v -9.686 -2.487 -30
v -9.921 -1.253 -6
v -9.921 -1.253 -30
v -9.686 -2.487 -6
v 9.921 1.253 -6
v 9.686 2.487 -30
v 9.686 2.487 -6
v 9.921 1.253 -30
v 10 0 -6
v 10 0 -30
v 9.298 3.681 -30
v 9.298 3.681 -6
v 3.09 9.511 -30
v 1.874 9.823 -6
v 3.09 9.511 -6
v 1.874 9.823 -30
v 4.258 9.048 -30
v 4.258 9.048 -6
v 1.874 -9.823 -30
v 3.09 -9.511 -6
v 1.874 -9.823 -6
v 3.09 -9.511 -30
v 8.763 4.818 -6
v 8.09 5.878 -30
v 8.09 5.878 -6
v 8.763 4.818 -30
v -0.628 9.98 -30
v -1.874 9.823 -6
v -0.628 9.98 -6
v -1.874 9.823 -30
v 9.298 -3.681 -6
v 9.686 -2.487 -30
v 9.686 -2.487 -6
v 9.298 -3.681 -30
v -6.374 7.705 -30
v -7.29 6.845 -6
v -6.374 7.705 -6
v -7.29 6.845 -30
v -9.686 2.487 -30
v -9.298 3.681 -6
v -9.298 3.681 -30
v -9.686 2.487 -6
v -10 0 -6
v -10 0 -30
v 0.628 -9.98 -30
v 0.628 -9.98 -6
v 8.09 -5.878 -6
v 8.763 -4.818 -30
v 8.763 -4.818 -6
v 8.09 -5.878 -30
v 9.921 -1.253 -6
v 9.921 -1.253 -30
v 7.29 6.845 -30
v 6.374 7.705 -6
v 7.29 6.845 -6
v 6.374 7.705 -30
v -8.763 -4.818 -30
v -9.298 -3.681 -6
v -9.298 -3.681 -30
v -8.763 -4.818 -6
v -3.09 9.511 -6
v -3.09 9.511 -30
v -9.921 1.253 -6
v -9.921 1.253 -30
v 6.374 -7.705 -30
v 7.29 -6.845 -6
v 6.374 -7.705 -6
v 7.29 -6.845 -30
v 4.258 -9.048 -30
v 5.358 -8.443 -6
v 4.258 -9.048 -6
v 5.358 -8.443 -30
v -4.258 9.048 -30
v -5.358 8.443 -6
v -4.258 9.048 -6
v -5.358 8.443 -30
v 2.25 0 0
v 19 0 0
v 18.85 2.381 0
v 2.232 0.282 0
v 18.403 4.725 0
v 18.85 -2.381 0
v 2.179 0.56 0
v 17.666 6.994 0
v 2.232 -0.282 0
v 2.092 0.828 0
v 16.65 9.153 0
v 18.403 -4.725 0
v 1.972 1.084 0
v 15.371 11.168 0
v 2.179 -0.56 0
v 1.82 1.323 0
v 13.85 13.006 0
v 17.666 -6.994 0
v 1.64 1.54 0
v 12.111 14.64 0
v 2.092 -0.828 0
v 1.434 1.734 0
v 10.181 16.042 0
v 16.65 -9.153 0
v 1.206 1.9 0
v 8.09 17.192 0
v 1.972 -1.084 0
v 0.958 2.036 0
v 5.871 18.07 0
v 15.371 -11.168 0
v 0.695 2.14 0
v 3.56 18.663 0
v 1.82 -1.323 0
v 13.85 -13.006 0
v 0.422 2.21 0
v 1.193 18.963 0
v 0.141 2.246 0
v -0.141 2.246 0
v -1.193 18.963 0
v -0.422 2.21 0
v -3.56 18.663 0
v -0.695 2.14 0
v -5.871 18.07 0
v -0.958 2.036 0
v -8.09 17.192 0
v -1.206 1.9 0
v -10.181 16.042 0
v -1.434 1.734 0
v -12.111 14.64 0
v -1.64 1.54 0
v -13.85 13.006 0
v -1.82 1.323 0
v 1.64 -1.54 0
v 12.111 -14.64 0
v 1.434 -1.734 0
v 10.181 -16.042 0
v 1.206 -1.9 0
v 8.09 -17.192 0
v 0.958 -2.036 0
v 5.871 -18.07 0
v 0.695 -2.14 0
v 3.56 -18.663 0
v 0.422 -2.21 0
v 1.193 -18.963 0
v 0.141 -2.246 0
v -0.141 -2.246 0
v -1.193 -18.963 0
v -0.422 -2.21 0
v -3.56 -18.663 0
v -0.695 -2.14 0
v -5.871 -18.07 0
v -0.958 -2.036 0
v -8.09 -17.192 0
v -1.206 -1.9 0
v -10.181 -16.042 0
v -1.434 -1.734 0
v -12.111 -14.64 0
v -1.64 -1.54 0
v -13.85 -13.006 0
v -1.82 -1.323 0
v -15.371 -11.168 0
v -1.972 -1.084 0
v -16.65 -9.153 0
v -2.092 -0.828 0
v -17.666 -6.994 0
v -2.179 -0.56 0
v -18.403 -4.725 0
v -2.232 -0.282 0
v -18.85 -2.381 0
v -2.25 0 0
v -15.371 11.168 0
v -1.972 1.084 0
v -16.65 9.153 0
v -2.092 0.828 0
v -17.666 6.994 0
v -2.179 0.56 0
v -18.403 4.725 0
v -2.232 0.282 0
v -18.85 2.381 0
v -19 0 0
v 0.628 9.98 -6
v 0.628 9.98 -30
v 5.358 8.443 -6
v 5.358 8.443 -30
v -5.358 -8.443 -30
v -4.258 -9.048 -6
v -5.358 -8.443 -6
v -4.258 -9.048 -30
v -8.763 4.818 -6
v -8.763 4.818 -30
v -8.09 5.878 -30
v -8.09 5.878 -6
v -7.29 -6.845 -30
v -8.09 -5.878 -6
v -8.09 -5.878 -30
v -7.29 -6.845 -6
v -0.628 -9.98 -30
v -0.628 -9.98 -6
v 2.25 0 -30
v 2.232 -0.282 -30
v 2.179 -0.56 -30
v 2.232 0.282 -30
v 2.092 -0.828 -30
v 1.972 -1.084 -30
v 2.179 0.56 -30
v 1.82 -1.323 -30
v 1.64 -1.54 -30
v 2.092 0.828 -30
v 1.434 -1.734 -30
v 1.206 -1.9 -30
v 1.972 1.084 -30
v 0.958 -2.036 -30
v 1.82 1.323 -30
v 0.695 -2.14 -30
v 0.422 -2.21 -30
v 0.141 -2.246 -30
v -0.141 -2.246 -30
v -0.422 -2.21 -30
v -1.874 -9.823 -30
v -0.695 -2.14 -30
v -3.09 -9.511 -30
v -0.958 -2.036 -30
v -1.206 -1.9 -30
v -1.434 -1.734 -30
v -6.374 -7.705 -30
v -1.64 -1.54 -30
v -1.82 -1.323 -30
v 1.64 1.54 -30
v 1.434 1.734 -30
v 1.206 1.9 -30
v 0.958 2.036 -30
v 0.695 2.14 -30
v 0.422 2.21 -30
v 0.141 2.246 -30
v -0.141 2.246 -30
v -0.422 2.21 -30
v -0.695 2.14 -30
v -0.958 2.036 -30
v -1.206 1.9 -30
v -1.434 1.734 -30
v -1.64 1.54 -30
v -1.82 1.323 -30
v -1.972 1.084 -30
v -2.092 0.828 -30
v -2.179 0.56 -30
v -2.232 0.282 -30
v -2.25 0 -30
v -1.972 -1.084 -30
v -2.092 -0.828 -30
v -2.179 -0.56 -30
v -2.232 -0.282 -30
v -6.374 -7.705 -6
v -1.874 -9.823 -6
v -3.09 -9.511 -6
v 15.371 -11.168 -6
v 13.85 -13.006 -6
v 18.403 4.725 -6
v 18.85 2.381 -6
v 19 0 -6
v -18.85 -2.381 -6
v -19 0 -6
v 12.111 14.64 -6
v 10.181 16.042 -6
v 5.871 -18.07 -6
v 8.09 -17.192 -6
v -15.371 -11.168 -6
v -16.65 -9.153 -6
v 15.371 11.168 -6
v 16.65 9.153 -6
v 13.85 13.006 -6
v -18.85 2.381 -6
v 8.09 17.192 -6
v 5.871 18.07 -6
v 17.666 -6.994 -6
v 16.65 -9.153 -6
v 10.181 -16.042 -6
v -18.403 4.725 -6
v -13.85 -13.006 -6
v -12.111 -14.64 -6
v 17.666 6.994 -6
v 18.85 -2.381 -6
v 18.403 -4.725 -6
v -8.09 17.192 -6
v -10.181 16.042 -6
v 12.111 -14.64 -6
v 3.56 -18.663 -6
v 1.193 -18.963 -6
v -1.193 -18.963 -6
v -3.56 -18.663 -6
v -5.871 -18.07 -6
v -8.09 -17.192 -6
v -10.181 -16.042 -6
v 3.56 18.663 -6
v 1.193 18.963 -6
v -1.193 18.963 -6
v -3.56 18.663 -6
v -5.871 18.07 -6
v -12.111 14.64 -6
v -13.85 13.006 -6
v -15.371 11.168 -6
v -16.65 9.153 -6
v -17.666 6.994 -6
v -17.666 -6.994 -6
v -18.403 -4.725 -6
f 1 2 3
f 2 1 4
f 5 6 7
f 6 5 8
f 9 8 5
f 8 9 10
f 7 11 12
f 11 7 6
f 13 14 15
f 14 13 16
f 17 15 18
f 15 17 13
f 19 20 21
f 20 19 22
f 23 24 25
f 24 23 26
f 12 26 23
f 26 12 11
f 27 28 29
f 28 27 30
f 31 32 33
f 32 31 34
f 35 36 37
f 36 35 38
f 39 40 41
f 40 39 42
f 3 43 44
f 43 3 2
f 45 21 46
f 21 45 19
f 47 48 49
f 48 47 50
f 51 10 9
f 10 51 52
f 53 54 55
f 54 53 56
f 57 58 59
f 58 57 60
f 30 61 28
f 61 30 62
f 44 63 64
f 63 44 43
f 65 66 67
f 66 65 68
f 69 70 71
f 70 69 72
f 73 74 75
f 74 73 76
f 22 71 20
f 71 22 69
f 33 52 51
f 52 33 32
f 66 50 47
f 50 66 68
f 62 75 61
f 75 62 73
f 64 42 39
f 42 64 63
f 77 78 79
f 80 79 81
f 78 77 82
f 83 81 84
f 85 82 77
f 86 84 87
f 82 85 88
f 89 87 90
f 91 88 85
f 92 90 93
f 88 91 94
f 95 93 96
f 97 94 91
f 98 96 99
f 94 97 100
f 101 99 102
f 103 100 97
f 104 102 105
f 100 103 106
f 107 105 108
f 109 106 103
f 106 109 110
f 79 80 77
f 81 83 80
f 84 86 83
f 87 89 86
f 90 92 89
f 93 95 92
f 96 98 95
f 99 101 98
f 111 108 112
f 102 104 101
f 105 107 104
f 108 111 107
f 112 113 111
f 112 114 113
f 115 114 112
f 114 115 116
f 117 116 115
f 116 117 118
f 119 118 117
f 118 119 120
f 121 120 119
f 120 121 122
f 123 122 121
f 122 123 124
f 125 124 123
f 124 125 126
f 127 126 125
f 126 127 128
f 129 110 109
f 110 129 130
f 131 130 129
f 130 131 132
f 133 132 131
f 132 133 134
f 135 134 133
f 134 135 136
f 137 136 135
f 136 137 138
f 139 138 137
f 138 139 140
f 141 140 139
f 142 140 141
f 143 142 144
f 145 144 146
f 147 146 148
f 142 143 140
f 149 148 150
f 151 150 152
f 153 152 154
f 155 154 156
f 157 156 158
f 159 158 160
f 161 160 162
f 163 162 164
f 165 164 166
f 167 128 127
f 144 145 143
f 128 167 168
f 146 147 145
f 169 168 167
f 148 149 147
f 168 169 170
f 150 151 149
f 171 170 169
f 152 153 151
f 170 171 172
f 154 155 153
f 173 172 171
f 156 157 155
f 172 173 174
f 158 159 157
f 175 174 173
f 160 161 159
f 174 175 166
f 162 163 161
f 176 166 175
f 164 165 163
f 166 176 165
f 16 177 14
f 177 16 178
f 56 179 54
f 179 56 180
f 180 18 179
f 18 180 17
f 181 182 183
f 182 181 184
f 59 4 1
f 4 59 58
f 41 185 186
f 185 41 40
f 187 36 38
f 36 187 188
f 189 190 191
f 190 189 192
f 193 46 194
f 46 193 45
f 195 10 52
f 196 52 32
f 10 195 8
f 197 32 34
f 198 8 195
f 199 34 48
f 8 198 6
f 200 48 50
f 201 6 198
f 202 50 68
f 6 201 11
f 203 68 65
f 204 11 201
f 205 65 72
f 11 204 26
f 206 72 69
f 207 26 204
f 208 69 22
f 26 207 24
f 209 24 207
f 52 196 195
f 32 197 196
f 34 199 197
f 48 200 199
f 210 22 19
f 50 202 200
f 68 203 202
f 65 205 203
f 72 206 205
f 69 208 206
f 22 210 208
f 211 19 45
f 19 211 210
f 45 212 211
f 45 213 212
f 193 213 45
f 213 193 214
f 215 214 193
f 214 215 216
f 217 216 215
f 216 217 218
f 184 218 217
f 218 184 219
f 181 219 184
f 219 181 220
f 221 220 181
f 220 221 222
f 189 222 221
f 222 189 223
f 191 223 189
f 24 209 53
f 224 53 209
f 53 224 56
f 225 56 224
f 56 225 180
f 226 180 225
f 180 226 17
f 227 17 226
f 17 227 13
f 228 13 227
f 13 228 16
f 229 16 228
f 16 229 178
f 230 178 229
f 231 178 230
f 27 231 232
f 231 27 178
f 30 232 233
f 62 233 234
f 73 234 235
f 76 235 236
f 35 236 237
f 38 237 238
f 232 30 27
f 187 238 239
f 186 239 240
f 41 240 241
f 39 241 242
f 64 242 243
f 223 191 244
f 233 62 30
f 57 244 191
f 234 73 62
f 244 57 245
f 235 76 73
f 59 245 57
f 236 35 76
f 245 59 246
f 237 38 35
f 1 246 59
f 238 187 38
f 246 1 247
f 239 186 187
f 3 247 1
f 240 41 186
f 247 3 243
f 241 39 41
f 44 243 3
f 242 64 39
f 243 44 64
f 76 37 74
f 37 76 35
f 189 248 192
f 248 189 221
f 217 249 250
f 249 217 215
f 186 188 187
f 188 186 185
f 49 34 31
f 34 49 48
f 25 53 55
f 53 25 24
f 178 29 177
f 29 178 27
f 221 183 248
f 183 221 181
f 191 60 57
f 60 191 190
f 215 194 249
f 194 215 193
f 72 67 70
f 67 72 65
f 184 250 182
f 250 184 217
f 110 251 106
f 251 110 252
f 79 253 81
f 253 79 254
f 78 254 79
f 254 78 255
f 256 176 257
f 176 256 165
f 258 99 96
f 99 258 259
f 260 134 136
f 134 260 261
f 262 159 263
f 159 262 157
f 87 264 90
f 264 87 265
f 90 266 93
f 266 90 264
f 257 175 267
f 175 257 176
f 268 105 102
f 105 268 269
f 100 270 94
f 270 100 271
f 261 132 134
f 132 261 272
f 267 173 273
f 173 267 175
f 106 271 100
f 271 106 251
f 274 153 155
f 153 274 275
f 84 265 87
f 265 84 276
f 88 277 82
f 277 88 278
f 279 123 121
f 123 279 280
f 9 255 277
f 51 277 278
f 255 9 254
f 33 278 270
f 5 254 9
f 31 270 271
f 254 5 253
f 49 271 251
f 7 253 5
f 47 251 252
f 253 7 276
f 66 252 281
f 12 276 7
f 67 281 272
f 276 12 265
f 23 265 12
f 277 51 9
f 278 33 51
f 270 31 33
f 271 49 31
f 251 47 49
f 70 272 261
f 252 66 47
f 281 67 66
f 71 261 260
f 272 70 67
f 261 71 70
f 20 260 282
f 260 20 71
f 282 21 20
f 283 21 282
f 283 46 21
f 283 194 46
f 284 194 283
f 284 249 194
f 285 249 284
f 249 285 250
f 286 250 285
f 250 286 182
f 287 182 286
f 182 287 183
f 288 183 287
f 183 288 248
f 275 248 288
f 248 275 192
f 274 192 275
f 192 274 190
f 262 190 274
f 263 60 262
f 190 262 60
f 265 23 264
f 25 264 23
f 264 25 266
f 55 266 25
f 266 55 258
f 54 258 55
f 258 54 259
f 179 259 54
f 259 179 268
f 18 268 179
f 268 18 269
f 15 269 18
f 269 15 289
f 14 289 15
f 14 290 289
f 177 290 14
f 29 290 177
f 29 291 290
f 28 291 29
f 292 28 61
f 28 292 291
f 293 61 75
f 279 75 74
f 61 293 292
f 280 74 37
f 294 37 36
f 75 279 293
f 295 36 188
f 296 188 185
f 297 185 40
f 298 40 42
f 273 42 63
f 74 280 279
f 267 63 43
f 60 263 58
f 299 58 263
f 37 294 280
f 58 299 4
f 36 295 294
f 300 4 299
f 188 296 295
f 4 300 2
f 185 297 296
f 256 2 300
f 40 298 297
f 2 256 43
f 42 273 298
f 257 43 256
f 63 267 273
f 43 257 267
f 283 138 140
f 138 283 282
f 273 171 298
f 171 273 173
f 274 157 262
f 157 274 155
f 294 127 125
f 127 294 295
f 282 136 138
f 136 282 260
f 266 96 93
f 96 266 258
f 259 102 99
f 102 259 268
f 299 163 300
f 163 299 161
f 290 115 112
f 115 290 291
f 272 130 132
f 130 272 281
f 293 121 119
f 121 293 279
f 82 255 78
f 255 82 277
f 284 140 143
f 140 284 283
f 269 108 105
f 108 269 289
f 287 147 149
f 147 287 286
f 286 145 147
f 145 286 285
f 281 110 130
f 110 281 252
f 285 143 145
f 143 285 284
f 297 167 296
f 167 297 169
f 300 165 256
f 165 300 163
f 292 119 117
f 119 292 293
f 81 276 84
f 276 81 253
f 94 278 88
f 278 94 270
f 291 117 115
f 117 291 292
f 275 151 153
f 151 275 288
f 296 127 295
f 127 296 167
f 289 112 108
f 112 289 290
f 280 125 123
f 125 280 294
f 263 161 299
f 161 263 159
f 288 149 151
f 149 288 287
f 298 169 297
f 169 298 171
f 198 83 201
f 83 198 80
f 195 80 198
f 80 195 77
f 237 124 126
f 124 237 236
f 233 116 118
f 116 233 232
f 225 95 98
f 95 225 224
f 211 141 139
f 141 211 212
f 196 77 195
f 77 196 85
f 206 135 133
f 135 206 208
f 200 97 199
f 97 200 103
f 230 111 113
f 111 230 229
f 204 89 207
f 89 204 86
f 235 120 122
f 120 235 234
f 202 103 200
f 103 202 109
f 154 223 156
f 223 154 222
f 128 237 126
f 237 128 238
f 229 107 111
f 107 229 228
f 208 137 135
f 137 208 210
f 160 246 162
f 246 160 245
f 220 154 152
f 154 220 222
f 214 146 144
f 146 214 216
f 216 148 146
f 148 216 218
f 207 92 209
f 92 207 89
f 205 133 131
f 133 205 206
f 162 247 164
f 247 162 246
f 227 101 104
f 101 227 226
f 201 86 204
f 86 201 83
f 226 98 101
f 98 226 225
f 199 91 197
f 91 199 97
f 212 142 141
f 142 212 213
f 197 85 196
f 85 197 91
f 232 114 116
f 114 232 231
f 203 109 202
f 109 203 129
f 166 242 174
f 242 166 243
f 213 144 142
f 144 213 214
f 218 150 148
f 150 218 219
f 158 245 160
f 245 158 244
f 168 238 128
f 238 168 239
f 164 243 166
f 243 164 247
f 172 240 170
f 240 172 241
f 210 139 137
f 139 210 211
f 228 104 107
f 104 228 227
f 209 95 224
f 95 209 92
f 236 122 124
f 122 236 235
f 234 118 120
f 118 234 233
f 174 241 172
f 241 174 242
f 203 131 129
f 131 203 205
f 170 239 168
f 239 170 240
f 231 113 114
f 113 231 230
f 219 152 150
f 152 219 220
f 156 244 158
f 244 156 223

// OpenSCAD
$fn = 50;


difference() {
	union() {
		translate(v = [0, 0, -30.0000000000]) {
			cylinder(h = 30, r = 10.0000000000);
		}
		translate(v = [0, 0, -6.0000000000]) {
			cylinder(h = 6, r = 19.0000000000);
		}
	}
	union() {
		#translate(v = [0, 0, -30]) {
			cylinder(h = 30, r = 2.2500000000);
		}
	}
}
